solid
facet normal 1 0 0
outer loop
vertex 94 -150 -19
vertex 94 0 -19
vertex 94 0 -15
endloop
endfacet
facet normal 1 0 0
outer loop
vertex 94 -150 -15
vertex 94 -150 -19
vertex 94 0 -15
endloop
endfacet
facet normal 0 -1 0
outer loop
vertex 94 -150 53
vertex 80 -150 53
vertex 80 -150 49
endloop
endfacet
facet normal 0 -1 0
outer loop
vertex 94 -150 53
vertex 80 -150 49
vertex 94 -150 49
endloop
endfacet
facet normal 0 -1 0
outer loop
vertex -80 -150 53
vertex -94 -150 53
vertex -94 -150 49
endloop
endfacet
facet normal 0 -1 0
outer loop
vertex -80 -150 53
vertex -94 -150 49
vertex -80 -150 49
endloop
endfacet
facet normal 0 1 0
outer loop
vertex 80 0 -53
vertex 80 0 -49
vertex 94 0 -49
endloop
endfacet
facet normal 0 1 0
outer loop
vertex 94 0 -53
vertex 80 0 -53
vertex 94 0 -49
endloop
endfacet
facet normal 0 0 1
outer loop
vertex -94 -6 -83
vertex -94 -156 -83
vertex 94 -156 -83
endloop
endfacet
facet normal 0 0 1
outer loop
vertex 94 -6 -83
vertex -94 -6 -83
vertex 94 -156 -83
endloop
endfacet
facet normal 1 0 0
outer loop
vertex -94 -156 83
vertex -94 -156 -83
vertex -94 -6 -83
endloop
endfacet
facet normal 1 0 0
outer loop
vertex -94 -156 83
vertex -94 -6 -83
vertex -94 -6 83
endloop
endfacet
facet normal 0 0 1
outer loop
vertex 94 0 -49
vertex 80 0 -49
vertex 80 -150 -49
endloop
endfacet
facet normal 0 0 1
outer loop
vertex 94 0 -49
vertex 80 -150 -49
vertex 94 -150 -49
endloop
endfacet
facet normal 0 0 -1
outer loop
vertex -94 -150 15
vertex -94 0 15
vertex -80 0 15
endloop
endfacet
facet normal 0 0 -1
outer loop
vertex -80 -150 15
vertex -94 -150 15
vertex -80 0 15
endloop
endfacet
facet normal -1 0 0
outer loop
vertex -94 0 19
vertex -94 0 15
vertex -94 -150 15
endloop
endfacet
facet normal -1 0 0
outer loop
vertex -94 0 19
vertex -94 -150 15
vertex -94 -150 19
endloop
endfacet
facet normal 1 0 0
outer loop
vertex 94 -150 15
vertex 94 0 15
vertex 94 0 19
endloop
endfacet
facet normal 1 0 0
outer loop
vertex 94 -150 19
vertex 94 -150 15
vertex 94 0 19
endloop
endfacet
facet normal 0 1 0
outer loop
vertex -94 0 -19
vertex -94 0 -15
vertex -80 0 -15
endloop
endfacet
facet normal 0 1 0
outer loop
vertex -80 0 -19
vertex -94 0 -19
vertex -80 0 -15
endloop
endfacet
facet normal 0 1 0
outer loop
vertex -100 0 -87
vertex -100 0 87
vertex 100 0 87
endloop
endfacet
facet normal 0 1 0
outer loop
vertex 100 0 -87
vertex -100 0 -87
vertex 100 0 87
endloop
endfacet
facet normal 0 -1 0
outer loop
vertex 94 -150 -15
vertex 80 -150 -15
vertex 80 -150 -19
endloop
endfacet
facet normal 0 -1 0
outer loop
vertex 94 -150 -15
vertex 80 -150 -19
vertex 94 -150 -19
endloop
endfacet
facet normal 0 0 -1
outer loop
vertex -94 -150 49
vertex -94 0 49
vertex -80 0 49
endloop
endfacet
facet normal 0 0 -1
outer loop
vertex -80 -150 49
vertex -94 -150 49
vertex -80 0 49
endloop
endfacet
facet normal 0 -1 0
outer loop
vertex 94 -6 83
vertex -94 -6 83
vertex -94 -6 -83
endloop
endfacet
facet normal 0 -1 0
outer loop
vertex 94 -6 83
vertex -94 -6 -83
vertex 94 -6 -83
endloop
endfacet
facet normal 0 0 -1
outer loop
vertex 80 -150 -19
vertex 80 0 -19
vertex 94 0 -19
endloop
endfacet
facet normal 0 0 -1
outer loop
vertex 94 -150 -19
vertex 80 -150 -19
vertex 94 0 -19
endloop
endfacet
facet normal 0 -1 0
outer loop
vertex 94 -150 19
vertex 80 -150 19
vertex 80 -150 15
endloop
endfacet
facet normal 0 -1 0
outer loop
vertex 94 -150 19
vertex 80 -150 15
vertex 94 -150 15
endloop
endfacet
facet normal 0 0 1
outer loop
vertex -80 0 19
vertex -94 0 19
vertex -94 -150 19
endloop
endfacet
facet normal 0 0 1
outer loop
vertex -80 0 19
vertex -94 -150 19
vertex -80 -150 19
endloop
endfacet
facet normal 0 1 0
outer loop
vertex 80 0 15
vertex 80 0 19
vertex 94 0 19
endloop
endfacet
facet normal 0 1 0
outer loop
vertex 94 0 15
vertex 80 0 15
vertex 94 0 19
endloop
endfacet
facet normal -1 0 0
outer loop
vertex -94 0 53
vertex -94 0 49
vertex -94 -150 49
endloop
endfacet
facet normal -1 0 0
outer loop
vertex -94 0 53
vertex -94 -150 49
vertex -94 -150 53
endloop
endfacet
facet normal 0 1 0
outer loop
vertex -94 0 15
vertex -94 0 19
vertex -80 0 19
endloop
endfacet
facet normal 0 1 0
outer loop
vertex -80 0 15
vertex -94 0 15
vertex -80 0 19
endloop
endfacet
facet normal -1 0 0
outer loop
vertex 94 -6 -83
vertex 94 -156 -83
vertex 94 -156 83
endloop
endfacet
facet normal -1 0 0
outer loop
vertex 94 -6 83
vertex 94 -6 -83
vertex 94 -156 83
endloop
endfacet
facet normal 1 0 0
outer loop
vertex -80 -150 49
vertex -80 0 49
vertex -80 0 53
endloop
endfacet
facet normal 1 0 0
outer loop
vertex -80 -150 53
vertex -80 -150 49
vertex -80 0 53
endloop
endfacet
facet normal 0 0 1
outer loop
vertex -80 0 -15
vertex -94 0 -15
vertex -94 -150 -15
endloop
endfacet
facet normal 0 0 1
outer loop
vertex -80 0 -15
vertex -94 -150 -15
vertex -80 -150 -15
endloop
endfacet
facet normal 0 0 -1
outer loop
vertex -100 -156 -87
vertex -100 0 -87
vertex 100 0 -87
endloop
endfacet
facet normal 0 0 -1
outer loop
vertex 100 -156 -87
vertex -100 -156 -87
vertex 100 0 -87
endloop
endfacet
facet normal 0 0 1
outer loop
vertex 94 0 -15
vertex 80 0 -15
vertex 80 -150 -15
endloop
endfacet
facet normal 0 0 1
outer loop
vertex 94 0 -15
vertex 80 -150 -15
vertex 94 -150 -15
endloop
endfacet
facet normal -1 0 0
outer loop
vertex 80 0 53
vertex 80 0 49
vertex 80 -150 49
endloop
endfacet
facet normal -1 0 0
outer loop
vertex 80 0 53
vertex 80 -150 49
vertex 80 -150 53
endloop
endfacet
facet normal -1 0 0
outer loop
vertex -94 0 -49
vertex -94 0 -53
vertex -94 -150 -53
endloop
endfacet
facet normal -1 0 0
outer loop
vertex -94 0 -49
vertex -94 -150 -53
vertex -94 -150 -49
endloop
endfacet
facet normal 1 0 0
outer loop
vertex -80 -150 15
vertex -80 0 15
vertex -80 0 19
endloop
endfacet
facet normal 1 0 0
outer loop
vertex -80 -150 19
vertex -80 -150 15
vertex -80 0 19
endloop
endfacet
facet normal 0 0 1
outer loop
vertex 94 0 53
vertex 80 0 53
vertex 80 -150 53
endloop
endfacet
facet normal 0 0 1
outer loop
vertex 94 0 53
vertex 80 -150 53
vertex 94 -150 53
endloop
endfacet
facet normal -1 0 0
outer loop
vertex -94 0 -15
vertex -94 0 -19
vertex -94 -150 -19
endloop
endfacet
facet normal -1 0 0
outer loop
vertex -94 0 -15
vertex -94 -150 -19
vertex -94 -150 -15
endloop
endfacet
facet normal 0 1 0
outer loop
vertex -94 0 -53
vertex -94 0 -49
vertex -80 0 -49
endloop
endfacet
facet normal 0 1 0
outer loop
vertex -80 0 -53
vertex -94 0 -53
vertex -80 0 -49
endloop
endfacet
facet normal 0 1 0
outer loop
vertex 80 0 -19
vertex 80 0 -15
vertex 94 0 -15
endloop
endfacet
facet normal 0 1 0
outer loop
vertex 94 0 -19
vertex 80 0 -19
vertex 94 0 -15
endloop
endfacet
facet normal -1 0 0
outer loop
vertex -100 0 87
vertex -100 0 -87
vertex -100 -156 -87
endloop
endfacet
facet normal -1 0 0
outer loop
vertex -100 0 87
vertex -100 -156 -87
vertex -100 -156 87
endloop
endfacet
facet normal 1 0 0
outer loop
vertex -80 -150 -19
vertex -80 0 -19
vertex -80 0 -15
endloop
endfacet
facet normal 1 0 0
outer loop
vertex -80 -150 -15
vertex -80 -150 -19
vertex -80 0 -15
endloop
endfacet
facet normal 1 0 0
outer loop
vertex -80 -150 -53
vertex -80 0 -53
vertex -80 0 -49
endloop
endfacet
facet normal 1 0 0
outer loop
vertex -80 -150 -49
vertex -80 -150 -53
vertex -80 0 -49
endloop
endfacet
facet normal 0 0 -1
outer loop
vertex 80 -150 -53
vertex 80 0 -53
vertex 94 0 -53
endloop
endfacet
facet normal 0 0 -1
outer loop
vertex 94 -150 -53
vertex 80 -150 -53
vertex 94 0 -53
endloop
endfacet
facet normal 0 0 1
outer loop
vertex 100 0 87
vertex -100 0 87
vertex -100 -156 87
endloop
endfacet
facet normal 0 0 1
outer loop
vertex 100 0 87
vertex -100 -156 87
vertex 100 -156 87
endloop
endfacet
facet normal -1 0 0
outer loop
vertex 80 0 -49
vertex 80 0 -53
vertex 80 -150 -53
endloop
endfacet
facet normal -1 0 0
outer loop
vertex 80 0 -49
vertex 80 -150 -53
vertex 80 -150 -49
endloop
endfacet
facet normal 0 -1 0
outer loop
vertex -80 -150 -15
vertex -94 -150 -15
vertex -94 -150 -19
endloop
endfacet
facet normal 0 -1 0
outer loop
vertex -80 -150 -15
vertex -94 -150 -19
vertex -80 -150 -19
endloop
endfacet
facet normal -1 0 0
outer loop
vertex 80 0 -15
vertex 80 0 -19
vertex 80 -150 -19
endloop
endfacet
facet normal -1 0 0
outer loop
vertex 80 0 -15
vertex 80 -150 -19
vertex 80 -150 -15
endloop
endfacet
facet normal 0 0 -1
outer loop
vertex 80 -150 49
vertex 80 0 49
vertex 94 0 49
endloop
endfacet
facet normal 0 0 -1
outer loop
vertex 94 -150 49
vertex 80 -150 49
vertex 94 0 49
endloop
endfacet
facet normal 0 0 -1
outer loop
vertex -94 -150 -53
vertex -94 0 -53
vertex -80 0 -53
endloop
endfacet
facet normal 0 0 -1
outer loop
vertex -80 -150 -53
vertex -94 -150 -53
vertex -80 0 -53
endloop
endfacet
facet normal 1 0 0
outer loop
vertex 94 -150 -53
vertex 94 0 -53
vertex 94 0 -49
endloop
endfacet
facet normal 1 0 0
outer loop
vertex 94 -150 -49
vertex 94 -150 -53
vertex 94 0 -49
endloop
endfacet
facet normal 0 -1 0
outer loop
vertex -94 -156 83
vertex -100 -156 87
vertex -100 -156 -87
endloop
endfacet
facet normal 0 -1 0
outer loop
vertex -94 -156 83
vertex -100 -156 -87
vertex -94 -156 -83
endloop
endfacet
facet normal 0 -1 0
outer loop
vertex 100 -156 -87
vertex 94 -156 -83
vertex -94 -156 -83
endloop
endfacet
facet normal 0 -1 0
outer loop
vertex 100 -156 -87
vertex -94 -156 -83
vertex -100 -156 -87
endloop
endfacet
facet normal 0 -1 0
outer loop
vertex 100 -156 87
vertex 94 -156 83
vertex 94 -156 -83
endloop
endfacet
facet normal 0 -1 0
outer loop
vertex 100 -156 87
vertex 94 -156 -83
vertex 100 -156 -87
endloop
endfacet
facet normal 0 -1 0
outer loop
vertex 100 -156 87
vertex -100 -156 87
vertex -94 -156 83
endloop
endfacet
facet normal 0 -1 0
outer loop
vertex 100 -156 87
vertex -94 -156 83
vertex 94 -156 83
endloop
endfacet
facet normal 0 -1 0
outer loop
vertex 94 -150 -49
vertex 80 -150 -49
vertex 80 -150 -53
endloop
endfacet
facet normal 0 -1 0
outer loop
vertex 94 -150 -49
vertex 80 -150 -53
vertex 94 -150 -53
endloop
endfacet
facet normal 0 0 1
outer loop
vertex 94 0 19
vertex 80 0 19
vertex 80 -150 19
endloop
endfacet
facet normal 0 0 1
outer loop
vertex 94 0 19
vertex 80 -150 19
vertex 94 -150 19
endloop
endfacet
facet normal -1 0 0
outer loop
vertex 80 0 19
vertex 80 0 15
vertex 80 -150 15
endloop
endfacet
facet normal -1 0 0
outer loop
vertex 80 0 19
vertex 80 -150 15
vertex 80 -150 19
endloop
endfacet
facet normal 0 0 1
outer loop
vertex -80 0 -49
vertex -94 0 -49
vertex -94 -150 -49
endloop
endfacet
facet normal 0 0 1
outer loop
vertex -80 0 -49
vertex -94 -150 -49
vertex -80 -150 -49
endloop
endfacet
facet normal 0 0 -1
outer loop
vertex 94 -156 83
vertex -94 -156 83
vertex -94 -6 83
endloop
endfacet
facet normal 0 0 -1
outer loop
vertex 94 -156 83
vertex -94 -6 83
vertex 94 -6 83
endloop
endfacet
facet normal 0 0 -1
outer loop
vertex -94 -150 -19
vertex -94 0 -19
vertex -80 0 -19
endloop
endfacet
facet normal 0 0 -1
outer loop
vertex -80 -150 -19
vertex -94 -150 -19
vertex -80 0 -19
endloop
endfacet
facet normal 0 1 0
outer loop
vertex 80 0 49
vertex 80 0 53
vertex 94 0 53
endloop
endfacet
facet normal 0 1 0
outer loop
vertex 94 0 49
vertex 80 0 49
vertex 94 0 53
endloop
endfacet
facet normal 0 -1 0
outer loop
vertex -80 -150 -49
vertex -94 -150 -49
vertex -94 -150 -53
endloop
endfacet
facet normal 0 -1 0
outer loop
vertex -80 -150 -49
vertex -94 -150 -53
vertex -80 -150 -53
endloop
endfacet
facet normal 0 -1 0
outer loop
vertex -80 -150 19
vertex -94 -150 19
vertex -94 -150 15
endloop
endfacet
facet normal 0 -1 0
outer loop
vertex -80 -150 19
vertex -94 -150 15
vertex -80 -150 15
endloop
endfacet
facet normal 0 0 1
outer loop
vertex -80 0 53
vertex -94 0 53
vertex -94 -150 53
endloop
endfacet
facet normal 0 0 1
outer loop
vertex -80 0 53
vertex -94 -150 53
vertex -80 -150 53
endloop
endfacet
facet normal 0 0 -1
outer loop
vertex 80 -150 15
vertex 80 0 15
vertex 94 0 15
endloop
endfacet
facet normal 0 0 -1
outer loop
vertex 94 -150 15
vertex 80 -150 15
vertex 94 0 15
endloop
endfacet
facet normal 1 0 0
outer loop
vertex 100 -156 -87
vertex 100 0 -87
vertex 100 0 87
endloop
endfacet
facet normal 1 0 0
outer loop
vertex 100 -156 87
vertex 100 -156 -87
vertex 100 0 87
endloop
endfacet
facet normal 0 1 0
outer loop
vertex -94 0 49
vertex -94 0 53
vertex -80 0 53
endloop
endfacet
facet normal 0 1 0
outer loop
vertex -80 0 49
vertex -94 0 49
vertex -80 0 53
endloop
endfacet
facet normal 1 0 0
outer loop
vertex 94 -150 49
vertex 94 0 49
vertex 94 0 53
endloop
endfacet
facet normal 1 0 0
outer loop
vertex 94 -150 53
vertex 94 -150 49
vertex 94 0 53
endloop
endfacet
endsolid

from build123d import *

# Parameters (mm, degrees)
F0_W     = 200
F0_H     = 174
F1_DEPTH = 156
F2_W     = 188
F2_H     = 166
F3_DEPTH = 150
F4_W     = 14
F4_H     = 4
F5_DEPTH = 150


with BuildPart() as f1:
    # F0 (on Front) → F1 (new body)
    with BuildSketch(Plane.XZ):
        Rectangle(F0_W, F0_H)
    extrude(amount=F1_DEPTH)

    # F2 (on face) → F3 (cut)
    with BuildSketch(Plane.XZ.offset(156)):
        Rectangle(F2_W, F2_H)
    extrude(amount=-F3_DEPTH, mode=Mode.SUBTRACT)


with BuildPart() as f5:
    # F4 (on Front) → F5 (new body)
    with BuildSketch(Plane.XZ):
        with Locations((-87, 51)):
            Rectangle(F4_W, F4_H)
        with Locations((-87, 17)):
            Rectangle(F4_W, F4_H)
        with Locations((-87, -17)):
            Rectangle(F4_W, F4_H)
        with Locations((-87, -51)):
            Rectangle(F4_W, F4_H)
        with Locations((87, -51)):
            Rectangle(F4_W, F4_H)
        with Locations((87, -17)):
            Rectangle(F4_W, F4_H)
        with Locations((87, 17)):
            Rectangle(F4_W, F4_H)
        with Locations((87, 51)):
            Rectangle(F4_W, F4_H)
    extrude(amount=F5_DEPTH)


solid = Compound([f1.part, f5.part])
